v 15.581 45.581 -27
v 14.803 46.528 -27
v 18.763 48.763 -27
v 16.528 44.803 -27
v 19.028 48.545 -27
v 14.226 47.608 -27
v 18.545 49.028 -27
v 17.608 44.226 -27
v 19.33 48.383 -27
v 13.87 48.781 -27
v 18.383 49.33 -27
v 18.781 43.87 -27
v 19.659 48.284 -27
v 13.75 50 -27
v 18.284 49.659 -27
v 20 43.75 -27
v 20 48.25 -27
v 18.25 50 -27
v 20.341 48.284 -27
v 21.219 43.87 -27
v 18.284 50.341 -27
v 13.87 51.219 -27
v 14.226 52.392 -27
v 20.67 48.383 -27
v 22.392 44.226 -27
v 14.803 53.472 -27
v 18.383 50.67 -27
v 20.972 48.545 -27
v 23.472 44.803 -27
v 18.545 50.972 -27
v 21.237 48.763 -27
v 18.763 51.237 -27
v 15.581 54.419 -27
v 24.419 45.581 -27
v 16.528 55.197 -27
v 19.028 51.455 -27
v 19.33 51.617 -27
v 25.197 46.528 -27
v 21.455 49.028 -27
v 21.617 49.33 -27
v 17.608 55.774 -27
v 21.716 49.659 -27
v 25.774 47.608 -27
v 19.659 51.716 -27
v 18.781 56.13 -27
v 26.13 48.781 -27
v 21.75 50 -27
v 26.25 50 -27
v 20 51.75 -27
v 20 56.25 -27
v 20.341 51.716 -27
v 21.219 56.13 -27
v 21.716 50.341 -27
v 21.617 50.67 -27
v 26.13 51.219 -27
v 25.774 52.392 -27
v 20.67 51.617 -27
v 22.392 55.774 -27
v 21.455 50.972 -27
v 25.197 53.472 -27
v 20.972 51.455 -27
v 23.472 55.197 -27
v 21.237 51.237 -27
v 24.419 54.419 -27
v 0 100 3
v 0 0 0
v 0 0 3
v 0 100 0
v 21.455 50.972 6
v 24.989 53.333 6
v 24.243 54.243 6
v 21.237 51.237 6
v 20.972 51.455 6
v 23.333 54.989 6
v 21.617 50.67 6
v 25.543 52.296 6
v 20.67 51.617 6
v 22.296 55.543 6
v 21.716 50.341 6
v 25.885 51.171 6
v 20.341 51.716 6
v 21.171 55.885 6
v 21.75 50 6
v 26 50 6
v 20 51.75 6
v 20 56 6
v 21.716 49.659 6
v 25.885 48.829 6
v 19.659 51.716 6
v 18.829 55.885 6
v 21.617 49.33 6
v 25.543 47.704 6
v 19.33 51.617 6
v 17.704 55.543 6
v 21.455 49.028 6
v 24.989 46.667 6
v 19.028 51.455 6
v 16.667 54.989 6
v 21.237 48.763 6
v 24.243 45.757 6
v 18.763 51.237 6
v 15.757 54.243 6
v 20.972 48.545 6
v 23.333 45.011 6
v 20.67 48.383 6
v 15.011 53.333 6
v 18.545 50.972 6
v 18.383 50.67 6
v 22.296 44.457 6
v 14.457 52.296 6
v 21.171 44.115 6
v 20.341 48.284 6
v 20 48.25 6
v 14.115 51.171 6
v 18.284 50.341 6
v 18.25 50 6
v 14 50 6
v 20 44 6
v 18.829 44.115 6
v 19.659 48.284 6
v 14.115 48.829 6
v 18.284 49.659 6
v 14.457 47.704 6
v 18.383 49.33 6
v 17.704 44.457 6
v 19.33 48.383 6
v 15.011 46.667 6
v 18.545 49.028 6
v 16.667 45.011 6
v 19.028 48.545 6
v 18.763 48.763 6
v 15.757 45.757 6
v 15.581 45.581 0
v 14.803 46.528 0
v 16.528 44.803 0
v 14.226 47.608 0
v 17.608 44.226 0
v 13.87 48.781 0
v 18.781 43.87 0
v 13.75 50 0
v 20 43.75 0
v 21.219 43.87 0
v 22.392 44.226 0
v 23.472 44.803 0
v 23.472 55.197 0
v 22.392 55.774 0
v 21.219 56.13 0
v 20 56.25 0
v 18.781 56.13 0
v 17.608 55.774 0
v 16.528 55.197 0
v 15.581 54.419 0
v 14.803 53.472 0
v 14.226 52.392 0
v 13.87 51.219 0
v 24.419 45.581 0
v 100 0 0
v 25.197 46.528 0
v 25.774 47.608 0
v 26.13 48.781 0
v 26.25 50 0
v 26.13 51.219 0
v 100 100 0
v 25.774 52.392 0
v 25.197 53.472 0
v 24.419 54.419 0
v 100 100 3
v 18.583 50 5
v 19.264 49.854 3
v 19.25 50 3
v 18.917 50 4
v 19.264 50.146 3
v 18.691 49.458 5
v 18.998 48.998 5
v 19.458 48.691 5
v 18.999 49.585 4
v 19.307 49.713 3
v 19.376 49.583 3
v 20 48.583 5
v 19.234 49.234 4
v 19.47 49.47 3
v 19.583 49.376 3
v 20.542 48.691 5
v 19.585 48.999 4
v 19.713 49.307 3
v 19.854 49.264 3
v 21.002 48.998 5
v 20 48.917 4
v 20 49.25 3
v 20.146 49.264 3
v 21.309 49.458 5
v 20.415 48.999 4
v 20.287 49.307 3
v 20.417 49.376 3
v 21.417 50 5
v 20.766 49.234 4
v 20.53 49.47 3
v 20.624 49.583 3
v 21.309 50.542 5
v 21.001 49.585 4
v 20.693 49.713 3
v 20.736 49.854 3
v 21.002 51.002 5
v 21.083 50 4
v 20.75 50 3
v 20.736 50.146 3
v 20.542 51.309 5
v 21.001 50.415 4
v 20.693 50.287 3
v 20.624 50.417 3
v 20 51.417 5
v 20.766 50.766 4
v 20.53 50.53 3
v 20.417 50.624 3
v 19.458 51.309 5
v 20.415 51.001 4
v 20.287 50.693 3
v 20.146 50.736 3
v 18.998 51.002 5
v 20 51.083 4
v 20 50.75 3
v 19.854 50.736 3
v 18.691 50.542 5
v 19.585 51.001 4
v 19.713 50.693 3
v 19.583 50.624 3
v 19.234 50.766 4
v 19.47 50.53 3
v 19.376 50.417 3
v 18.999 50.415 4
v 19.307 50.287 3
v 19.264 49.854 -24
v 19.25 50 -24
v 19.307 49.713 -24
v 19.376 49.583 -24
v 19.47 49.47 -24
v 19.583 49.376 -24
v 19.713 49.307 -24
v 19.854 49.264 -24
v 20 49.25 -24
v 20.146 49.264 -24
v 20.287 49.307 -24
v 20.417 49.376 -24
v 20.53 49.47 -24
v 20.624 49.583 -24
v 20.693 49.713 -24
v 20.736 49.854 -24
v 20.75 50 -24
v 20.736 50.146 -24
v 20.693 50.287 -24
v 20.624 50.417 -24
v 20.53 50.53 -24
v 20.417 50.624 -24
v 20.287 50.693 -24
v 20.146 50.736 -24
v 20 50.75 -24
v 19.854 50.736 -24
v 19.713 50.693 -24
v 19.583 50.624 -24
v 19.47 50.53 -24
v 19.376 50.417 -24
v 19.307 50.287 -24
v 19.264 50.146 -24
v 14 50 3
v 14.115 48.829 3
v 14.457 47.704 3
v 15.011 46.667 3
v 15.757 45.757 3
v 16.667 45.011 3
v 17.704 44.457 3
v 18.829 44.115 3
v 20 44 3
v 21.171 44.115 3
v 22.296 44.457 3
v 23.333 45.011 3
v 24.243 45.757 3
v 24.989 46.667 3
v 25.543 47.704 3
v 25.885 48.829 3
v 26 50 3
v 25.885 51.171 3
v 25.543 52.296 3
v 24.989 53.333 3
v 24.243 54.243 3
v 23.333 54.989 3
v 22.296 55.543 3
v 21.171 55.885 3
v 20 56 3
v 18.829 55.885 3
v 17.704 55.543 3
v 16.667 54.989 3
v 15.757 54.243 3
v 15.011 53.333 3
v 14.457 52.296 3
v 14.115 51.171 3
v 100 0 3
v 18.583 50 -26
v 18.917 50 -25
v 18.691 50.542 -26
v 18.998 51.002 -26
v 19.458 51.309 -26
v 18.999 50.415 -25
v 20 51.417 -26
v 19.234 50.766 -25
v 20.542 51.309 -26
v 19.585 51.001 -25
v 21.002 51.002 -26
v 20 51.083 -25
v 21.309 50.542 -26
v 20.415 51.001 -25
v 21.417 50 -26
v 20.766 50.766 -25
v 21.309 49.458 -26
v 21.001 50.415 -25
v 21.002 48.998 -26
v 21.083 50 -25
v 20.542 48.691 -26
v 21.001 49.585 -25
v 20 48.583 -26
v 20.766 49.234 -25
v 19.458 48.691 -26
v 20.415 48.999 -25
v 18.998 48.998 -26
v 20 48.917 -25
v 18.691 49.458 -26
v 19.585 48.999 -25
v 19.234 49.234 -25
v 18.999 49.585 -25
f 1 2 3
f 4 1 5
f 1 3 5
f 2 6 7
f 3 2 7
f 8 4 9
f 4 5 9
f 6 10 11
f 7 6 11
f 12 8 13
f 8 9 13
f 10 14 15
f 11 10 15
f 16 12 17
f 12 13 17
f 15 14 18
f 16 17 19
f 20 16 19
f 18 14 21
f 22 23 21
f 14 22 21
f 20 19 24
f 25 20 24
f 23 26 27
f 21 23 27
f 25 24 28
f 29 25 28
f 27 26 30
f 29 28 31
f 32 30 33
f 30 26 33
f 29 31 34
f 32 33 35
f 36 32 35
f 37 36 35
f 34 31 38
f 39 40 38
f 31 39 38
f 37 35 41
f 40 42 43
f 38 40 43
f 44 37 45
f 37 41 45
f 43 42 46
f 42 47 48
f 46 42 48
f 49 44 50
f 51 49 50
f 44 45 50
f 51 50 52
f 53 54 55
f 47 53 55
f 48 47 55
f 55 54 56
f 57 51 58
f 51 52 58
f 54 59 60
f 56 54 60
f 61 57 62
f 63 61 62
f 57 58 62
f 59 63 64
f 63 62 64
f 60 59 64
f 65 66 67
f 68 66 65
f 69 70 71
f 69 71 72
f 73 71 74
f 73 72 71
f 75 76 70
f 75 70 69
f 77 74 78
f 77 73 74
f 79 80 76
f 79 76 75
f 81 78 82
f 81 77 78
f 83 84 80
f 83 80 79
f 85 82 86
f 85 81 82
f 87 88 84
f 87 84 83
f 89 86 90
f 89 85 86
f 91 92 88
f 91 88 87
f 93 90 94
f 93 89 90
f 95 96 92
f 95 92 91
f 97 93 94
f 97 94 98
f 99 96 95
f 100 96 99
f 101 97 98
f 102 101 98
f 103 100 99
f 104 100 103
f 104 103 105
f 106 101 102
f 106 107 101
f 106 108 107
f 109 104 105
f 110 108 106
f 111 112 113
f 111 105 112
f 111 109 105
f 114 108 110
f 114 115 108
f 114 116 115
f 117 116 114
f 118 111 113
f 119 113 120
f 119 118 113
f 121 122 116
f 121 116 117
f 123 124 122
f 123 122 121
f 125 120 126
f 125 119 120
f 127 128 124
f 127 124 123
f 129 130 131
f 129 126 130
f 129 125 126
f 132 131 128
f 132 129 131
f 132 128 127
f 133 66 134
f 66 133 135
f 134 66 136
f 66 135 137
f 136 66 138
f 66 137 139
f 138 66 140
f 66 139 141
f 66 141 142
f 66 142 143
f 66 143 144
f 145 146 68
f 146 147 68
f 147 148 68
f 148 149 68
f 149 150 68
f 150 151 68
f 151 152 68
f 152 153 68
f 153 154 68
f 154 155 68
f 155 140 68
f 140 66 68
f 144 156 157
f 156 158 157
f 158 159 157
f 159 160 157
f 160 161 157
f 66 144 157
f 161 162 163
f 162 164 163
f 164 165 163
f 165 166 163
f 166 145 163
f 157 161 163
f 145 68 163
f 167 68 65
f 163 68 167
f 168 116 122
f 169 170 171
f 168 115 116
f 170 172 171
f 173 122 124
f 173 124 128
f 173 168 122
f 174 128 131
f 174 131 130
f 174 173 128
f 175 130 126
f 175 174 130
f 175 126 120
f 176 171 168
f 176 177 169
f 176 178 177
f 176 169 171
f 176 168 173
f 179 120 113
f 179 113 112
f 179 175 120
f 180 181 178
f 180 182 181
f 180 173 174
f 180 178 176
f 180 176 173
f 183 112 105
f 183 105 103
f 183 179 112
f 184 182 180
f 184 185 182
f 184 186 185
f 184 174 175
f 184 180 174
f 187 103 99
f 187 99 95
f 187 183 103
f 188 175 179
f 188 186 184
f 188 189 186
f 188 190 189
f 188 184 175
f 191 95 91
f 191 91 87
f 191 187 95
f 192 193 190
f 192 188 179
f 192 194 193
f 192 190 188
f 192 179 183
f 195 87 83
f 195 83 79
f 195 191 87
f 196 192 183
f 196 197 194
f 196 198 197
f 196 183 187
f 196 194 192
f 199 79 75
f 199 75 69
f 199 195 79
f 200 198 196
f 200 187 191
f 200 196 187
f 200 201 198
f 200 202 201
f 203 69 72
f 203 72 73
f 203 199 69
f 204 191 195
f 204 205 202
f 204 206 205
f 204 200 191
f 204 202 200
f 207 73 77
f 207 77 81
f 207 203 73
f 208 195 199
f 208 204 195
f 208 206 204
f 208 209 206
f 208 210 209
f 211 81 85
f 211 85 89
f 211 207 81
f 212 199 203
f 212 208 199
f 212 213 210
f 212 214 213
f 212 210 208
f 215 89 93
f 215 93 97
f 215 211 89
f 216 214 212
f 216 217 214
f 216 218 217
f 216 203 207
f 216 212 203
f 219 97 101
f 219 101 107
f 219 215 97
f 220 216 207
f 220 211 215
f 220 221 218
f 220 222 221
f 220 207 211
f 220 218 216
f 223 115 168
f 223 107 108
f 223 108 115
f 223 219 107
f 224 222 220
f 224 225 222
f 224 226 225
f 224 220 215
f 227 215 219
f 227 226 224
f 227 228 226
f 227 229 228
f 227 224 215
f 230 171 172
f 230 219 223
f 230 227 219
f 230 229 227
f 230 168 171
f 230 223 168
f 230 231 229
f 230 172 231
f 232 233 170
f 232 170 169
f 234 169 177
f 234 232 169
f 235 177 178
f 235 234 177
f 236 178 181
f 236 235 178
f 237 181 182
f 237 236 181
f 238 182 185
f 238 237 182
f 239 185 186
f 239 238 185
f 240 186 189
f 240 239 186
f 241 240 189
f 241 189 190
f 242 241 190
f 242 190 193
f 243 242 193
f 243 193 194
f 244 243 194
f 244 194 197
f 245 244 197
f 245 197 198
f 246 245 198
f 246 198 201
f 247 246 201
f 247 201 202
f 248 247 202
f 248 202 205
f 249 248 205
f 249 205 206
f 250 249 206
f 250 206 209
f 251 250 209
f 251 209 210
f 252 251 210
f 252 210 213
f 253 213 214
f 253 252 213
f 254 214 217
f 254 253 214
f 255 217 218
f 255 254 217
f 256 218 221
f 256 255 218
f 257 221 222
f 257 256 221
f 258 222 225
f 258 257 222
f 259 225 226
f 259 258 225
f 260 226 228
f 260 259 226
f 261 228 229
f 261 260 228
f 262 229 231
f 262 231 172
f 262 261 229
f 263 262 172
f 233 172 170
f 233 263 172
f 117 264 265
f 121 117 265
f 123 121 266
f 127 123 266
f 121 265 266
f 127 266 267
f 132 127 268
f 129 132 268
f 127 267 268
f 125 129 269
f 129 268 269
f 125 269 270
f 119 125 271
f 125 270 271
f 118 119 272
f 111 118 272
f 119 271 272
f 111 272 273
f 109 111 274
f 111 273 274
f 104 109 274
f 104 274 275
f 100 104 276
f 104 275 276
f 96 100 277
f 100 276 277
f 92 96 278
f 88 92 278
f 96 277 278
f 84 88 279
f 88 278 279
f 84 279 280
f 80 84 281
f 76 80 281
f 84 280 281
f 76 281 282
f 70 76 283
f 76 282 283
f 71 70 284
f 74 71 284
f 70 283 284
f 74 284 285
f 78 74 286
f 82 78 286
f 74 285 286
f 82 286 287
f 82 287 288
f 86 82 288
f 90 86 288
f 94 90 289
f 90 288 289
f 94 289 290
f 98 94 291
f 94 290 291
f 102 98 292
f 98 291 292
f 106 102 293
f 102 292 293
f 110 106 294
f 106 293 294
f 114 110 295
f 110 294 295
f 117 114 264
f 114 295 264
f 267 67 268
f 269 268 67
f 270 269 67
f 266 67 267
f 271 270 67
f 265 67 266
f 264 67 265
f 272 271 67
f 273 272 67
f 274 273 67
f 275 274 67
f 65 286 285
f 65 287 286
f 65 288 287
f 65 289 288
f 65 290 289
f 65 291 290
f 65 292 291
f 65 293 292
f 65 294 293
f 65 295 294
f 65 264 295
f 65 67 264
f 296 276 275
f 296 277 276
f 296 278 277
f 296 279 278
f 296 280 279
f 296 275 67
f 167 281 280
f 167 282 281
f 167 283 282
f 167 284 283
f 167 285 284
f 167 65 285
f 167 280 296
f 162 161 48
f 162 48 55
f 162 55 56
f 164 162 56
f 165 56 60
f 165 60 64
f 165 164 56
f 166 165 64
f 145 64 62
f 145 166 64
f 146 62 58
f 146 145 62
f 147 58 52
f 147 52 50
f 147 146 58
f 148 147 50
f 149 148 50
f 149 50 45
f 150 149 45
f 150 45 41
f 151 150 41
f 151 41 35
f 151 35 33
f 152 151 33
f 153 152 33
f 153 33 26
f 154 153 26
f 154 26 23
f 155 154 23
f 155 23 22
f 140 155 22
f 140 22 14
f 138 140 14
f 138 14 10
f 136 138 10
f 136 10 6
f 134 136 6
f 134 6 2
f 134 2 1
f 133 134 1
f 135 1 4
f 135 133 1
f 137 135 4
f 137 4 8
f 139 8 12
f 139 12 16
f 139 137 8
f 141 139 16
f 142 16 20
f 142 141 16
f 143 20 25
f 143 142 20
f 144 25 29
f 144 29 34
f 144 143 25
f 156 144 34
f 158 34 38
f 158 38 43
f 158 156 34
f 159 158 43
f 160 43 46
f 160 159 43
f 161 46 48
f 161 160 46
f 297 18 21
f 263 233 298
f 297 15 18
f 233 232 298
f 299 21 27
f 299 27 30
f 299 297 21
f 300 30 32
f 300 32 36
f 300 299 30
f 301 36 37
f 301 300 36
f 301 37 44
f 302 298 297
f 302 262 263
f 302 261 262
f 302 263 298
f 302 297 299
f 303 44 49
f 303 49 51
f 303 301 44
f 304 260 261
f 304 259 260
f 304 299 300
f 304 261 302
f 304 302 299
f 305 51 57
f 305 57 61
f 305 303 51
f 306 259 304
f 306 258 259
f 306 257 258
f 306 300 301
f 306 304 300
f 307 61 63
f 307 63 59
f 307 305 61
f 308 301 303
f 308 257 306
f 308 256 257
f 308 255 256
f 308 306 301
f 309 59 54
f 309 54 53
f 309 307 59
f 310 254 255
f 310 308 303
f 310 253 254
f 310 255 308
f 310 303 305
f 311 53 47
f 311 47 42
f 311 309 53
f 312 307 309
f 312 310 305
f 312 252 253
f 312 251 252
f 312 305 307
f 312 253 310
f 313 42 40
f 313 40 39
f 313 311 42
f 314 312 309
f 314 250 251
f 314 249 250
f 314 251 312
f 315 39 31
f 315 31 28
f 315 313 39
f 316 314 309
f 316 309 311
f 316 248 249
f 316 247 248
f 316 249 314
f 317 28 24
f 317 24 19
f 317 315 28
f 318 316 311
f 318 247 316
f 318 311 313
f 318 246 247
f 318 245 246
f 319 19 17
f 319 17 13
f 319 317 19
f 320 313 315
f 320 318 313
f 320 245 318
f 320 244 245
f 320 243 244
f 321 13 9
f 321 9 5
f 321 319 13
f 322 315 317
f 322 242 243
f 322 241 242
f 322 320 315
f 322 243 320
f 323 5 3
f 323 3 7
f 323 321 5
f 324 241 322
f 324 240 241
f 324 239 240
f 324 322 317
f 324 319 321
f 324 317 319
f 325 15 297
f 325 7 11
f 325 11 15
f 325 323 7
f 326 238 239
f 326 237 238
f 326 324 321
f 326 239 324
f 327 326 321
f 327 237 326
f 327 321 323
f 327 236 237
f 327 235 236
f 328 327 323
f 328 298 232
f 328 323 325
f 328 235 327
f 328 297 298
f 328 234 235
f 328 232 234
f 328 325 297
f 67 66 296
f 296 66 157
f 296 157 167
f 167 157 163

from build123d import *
from OCP.BRepFilletAPI import BRepFilletAPI_MakeChamfer

# Parameters (mm, degrees)
SKETCH1_W           = 100
SKETCH1_H           = 100
BOSS_EXTRUDE1_DEPTH = 3
SKETCH2_R           = 6.25
BOSS_EXTRUDE2_DEPTH = 30
SKETCH3_R           = 0.75
CUT_EXTRUDE1_DEPTH  = 145.568322948
SKETCH4_R           = 6
SKETCH4_R_2         = 0.75
BOSS_EXTRUDE3_DEPTH = 3
CHAMFER1_SIZE       = 1
CHAMFER1_SIZE_2     = 3


with BuildPart() as part:
    # Sketch1 → Boss-Extrude1 (new body)
    with BuildSketch(Plane.XY):
        with Locations((50, 50)):
            Rectangle(SKETCH1_W, SKETCH1_H)
    extrude(amount=BOSS_EXTRUDE1_DEPTH)

    # Sketch2 → Boss-Extrude2 (add)
    with BuildSketch(Plane.XY.offset(3)):
        with Locations((20, 50)):
            Circle(SKETCH2_R)
    extrude(amount=-BOSS_EXTRUDE2_DEPTH)

    # Sketch3 → Cut-Extrude1 (cut, through all)
    with BuildSketch(Plane(origin=(0, 0, -27), x_dir=(-1, 0, 0), z_dir=(0, 0, -1))):
        with Locations((-20, 50)):
            Circle(SKETCH3_R)
    extrude(amount=-CUT_EXTRUDE1_DEPTH, mode=Mode.SUBTRACT)

    # Sketch4 → Boss-Extrude3 (add)
    with BuildSketch(Plane.XY.offset(3)):
        with Locations(Location((20, 50, 0), (0, 0, 180))):
            Circle(SKETCH4_R)
        with Locations(Location((20, 50, 0), (0, 0, 180))):
            Circle(SKETCH4_R_2, mode=Mode.SUBTRACT)
    extrude(amount=BOSS_EXTRUDE3_DEPTH)

    # Chamfer1
    chamfer1_edges_1 = [part.edges().sort_by_distance(p)[0] for p in [
        (20.75, 50, -27),
    ]]
    chamfer1_side_1 = [part.faces().sort_by_distance(p)[0] for p in [
        (20.77, 50, -27),
    ]]
    chamfer1_edges_2 = [part.edges().sort_by_distance(p)[0] for p in [
        (20.75, 50, 6),
    ]]
    chamfer1_side_2 = [part.faces().sort_by_distance(p)[0] for p in [
        (20.77, 50, 6),
    ]]
    chamfer1 = BRepFilletAPI_MakeChamfer(part.part.solid().wrapped)
    for e in chamfer1_edges_1:
        chamfer1.Add(CHAMFER1_SIZE - 0.0001, CHAMFER1_SIZE_2 - 0.0001, e.wrapped, chamfer1_side_1[0].wrapped)
    for e in chamfer1_edges_2:
        chamfer1.Add(CHAMFER1_SIZE - 0.0001, CHAMFER1_SIZE_2 - 0.0001, e.wrapped, chamfer1_side_2[0].wrapped)
    add(Compound.cast(chamfer1.Shape()), mode=Mode.REPLACE)  # a hair under: the kernel refuses the full size


solid = part.part
